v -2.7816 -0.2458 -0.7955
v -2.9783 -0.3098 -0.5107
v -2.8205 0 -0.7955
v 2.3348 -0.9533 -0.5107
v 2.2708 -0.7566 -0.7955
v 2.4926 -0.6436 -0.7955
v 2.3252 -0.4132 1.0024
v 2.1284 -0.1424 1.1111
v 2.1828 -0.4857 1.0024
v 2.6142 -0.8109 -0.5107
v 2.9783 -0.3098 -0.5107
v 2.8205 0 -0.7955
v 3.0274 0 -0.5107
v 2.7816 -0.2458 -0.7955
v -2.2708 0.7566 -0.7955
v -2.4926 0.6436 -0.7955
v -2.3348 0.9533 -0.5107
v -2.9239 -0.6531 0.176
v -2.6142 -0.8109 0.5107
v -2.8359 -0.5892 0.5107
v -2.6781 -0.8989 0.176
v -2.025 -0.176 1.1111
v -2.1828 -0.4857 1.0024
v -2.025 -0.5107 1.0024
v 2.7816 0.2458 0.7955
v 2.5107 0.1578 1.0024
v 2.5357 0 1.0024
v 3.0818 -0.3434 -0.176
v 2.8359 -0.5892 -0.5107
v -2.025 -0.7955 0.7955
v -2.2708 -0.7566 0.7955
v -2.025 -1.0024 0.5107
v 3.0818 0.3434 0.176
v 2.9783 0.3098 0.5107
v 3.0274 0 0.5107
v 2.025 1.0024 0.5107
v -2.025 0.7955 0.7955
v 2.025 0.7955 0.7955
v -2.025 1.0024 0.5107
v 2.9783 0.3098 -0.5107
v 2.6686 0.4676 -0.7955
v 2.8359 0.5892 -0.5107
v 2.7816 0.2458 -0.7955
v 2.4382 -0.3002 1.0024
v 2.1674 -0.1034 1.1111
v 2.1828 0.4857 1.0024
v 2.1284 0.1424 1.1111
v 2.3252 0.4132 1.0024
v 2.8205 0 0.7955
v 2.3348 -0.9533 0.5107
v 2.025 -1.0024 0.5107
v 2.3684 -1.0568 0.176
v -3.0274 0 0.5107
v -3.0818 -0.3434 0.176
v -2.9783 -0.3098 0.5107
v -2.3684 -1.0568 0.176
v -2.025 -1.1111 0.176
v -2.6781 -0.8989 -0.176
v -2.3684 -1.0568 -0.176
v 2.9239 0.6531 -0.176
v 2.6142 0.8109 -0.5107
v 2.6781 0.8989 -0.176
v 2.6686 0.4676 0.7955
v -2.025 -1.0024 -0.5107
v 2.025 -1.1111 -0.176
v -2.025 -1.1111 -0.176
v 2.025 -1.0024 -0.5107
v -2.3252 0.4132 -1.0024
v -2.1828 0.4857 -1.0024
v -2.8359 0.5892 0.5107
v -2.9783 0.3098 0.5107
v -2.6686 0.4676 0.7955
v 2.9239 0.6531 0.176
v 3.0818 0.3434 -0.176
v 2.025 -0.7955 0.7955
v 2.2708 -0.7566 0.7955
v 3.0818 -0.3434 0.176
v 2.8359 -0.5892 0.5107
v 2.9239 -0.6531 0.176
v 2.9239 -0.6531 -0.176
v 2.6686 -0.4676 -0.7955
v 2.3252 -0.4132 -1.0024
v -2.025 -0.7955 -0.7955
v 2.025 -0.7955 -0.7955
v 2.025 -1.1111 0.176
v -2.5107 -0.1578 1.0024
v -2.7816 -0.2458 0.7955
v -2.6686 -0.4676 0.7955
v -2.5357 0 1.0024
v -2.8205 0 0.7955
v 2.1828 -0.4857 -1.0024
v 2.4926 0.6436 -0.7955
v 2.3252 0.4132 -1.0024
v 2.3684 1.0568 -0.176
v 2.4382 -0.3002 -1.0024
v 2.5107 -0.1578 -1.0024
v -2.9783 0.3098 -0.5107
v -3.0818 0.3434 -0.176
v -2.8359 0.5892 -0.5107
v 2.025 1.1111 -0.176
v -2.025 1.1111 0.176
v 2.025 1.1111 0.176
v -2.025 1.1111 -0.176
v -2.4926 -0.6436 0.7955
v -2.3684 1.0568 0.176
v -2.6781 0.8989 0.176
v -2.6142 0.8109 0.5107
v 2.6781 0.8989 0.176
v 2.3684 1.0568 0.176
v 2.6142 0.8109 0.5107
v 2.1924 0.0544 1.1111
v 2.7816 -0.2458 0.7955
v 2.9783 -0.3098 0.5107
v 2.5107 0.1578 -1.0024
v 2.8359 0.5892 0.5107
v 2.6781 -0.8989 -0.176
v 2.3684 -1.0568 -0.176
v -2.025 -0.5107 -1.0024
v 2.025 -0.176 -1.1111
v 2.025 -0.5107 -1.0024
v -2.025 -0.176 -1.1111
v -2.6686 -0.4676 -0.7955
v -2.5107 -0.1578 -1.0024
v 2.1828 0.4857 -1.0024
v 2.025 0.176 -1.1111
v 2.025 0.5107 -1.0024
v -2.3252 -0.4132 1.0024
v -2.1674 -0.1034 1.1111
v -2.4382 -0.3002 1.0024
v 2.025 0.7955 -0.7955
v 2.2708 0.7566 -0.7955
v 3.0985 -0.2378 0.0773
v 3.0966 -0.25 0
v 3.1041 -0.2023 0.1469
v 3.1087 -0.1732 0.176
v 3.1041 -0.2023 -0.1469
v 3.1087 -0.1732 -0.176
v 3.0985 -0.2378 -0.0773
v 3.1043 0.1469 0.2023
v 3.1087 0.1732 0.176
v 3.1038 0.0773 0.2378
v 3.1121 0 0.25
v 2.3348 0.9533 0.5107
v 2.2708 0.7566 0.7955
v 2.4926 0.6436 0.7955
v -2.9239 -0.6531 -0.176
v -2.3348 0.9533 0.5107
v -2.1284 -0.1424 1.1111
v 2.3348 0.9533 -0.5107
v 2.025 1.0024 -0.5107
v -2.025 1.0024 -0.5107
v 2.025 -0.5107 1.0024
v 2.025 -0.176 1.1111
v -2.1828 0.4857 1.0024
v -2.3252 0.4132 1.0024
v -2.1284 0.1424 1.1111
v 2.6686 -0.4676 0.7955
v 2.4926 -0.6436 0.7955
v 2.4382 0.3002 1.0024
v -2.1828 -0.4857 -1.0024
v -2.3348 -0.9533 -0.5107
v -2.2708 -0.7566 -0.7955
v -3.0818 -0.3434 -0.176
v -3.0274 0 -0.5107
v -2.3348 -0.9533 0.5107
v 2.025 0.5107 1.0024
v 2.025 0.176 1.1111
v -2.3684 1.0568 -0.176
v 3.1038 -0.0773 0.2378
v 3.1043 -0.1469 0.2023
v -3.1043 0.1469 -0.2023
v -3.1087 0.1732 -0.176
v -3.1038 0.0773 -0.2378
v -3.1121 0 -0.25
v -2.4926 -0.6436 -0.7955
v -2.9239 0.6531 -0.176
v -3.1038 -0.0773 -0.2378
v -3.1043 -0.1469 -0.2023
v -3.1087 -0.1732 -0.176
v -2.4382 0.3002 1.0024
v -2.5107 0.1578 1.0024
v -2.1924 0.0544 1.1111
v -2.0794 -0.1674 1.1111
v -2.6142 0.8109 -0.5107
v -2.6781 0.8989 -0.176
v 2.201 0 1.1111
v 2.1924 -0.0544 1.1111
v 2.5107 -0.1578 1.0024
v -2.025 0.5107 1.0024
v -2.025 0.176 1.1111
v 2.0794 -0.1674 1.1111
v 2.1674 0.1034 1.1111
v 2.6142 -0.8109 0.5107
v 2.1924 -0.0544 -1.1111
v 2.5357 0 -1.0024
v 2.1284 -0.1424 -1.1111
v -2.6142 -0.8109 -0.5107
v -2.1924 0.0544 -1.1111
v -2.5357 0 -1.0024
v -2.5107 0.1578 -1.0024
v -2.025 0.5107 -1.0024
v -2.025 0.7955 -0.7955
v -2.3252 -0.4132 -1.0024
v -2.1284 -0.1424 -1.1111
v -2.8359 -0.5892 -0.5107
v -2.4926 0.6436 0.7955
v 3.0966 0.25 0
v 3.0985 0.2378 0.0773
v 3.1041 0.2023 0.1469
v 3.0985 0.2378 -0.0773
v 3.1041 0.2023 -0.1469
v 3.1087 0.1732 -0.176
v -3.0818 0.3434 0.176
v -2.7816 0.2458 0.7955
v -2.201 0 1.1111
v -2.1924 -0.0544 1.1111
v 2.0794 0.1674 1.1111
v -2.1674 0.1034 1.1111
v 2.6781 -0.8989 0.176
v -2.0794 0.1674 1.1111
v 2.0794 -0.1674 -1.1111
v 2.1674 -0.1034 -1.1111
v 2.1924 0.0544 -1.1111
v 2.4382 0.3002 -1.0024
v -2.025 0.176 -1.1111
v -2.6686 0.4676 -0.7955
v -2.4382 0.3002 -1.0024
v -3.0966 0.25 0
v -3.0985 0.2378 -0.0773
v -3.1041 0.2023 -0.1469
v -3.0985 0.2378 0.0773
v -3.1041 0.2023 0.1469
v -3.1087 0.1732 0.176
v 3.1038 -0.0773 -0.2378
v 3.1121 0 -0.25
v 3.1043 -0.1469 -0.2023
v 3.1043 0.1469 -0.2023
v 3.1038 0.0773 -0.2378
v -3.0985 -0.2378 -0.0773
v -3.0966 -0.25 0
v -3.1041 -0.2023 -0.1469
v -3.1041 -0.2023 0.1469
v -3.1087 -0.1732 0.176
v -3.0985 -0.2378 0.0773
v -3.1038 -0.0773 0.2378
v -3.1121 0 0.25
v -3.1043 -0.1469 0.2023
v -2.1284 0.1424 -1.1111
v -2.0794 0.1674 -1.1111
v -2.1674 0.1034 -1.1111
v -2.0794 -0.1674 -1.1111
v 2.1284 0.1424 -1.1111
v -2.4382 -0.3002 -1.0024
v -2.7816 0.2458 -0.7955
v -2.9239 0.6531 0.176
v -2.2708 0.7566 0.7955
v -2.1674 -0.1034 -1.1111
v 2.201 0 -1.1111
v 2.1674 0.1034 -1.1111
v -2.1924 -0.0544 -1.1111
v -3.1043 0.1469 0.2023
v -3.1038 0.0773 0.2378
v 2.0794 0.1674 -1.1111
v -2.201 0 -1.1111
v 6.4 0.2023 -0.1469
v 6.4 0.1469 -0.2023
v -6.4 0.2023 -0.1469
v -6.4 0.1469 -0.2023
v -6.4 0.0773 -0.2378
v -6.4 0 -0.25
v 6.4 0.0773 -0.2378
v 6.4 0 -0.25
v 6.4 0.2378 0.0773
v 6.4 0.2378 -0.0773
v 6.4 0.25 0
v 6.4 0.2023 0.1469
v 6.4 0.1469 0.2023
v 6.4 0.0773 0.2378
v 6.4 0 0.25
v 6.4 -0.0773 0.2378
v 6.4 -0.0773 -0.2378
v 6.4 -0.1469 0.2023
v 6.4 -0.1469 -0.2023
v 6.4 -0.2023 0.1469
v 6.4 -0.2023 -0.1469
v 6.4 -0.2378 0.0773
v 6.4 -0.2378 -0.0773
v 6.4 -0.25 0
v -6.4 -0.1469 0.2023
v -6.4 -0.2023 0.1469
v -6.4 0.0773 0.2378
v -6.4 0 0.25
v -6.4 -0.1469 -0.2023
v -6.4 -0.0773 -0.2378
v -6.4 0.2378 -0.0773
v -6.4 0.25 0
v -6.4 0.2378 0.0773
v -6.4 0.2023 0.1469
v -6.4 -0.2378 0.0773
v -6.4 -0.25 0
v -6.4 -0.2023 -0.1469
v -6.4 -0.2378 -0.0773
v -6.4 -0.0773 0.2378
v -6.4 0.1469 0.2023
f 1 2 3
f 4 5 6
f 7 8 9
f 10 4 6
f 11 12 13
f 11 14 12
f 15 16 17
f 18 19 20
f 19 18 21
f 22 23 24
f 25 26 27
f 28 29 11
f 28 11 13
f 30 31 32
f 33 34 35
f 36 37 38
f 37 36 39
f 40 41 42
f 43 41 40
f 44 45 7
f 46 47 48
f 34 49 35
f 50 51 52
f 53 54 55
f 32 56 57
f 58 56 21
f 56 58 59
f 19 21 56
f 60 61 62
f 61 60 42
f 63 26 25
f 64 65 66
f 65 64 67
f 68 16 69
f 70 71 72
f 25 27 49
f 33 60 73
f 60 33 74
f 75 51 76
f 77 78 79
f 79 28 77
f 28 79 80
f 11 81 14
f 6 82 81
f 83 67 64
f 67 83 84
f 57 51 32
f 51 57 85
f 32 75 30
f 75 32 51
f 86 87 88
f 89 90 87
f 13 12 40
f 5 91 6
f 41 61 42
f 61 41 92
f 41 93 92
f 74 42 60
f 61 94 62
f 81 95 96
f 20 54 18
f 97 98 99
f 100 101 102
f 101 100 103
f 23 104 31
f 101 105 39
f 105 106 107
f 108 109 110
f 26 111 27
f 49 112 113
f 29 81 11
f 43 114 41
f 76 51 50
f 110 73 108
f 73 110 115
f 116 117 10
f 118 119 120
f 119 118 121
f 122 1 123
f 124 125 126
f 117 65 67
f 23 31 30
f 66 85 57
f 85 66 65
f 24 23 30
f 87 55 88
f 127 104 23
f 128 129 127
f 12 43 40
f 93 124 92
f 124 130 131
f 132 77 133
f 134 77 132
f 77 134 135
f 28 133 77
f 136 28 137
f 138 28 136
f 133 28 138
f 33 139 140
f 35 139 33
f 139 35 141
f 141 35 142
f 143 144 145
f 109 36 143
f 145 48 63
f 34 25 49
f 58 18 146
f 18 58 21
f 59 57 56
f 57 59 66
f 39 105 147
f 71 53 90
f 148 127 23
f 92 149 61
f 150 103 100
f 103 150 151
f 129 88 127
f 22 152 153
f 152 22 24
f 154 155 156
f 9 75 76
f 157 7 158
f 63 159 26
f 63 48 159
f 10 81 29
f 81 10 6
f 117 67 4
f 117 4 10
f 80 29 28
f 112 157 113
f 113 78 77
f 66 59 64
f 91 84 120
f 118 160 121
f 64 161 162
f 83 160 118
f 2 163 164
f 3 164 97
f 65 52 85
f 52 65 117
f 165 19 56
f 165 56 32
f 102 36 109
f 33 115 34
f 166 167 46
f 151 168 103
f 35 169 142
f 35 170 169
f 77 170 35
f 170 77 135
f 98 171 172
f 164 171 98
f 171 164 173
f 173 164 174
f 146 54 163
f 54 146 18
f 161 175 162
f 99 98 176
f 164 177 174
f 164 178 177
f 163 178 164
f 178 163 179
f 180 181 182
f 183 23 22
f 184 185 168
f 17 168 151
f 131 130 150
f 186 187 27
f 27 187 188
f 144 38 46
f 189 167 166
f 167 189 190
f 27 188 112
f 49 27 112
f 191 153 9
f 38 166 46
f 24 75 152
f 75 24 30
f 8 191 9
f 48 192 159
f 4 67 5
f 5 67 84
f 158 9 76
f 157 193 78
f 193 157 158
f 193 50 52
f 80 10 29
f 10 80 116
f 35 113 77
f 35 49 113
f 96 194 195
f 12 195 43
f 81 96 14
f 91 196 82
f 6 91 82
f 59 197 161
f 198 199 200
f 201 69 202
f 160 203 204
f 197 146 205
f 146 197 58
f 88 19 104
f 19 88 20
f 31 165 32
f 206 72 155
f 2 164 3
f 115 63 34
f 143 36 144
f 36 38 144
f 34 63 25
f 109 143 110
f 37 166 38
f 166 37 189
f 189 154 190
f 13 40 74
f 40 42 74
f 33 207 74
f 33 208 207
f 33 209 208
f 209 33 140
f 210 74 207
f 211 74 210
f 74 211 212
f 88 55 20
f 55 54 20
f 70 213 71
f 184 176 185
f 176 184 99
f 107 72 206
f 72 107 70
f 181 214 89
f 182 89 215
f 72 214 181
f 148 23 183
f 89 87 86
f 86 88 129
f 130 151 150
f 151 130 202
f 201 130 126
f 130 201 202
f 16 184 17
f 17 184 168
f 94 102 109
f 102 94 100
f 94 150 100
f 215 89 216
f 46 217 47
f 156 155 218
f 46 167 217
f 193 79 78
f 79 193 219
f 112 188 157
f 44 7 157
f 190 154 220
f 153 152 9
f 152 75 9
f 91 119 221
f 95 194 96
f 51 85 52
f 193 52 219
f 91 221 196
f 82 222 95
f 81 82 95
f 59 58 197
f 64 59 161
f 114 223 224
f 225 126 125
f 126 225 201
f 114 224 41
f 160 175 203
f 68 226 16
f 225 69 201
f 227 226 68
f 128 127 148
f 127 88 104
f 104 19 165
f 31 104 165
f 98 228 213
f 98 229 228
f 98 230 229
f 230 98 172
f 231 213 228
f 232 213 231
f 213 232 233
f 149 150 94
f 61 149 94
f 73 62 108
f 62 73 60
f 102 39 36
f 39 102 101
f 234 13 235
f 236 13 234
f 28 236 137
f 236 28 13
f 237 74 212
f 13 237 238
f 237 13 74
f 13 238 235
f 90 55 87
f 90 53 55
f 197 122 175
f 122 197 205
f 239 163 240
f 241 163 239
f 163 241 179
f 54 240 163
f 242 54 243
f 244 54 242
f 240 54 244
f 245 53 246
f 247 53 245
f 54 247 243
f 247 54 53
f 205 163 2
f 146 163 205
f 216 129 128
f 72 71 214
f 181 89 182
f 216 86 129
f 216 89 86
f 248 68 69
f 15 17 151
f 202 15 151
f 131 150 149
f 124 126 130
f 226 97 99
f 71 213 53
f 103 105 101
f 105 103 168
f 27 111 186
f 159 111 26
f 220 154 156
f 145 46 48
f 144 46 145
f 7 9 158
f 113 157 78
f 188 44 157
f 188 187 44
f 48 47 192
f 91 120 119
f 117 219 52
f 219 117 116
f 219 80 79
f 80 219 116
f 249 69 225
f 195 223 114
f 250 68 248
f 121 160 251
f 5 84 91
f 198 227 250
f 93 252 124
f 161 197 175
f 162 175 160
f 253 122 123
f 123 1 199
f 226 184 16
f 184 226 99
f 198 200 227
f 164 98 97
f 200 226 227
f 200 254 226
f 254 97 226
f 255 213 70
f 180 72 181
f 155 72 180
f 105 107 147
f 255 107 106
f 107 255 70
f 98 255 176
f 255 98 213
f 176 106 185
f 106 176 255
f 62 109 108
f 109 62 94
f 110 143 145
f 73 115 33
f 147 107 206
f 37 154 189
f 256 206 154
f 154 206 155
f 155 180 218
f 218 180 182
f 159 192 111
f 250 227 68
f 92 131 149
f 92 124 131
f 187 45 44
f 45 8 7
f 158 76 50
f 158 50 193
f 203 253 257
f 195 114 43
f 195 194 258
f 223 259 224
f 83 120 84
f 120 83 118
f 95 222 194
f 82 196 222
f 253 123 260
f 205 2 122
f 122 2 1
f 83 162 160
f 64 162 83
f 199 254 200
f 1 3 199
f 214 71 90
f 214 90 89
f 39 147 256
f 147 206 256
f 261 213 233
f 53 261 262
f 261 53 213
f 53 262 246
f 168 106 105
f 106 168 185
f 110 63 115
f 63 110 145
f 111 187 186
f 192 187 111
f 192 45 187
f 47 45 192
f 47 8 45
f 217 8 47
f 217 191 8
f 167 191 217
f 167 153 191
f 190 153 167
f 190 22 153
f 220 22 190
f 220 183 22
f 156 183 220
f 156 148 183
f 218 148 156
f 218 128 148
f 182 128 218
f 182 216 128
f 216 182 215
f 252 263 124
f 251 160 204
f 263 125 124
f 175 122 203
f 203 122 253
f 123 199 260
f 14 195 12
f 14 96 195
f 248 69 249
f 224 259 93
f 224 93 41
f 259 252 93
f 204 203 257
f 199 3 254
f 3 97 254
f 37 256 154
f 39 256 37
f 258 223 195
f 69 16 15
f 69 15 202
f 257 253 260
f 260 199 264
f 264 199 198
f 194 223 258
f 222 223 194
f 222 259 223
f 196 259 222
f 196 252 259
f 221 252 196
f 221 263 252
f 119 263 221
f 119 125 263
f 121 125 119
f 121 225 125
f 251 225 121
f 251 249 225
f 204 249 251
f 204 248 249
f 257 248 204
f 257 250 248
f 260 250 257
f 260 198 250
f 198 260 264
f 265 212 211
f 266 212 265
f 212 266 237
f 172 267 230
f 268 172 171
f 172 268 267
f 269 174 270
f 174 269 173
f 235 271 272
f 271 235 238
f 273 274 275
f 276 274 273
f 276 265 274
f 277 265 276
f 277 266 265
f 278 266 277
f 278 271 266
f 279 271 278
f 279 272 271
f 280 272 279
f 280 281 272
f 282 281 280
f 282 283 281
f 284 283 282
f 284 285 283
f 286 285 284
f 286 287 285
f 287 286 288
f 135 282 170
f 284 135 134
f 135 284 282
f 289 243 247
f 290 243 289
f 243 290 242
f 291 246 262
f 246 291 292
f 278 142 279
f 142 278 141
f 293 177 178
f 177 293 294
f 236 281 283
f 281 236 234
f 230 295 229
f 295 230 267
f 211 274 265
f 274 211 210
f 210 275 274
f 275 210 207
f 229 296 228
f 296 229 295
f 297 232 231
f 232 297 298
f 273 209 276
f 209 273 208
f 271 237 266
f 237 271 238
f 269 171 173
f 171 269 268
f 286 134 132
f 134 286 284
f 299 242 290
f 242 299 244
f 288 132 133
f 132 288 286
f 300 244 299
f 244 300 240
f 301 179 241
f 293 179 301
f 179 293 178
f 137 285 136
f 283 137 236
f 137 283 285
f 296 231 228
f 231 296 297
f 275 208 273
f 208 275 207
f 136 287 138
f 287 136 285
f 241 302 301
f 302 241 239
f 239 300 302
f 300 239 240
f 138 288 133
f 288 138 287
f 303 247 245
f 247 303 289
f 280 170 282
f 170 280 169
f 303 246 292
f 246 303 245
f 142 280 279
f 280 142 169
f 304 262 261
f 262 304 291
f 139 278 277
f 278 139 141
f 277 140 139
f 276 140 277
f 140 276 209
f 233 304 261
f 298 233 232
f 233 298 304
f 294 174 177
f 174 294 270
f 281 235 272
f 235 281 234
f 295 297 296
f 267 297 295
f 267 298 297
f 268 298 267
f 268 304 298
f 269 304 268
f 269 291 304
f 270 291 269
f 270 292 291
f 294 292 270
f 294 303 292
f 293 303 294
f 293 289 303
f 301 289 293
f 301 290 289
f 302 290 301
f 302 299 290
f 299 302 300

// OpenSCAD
$fn=20;


module one_watt_resistor(){
    BODY_RAD = 4.5/2;
    WIRE_RAD = 0.75/2;
    TIP2TIP=13;

    hull(){
        translate([-(TIP2TIP/2-BODY_RAD),0,0]){
            sphere(r=BODY_RAD);
        }
        translate([(TIP2TIP/2-BODY_RAD),0,0]){
            sphere(r=BODY_RAD);
        }

    }
    rotate(90,[0,1,0]){
        cylinder(r=WIRE_RAD,h=25.6,center=true);
    }
}

module quarter_watt_resistor(){
    BODY_RAD = 2.25/2;
    WIRE_RAD = 0.5/2;
    TIP2TIP=6.3;
    INCH = 25.6;

    hull(){
        translate([-(TIP2TIP/2-BODY_RAD),0,0]){
            sphere(r=BODY_RAD);
        }
        translate([(TIP2TIP/2-BODY_RAD),0,0]){
            sphere(r=BODY_RAD);
        }

    }
    rotate(90,[0,1,0]){
        cylinder(r=WIRE_RAD,h=INCH/2,center=true);
    }
}

quarter_watt_resistor();
